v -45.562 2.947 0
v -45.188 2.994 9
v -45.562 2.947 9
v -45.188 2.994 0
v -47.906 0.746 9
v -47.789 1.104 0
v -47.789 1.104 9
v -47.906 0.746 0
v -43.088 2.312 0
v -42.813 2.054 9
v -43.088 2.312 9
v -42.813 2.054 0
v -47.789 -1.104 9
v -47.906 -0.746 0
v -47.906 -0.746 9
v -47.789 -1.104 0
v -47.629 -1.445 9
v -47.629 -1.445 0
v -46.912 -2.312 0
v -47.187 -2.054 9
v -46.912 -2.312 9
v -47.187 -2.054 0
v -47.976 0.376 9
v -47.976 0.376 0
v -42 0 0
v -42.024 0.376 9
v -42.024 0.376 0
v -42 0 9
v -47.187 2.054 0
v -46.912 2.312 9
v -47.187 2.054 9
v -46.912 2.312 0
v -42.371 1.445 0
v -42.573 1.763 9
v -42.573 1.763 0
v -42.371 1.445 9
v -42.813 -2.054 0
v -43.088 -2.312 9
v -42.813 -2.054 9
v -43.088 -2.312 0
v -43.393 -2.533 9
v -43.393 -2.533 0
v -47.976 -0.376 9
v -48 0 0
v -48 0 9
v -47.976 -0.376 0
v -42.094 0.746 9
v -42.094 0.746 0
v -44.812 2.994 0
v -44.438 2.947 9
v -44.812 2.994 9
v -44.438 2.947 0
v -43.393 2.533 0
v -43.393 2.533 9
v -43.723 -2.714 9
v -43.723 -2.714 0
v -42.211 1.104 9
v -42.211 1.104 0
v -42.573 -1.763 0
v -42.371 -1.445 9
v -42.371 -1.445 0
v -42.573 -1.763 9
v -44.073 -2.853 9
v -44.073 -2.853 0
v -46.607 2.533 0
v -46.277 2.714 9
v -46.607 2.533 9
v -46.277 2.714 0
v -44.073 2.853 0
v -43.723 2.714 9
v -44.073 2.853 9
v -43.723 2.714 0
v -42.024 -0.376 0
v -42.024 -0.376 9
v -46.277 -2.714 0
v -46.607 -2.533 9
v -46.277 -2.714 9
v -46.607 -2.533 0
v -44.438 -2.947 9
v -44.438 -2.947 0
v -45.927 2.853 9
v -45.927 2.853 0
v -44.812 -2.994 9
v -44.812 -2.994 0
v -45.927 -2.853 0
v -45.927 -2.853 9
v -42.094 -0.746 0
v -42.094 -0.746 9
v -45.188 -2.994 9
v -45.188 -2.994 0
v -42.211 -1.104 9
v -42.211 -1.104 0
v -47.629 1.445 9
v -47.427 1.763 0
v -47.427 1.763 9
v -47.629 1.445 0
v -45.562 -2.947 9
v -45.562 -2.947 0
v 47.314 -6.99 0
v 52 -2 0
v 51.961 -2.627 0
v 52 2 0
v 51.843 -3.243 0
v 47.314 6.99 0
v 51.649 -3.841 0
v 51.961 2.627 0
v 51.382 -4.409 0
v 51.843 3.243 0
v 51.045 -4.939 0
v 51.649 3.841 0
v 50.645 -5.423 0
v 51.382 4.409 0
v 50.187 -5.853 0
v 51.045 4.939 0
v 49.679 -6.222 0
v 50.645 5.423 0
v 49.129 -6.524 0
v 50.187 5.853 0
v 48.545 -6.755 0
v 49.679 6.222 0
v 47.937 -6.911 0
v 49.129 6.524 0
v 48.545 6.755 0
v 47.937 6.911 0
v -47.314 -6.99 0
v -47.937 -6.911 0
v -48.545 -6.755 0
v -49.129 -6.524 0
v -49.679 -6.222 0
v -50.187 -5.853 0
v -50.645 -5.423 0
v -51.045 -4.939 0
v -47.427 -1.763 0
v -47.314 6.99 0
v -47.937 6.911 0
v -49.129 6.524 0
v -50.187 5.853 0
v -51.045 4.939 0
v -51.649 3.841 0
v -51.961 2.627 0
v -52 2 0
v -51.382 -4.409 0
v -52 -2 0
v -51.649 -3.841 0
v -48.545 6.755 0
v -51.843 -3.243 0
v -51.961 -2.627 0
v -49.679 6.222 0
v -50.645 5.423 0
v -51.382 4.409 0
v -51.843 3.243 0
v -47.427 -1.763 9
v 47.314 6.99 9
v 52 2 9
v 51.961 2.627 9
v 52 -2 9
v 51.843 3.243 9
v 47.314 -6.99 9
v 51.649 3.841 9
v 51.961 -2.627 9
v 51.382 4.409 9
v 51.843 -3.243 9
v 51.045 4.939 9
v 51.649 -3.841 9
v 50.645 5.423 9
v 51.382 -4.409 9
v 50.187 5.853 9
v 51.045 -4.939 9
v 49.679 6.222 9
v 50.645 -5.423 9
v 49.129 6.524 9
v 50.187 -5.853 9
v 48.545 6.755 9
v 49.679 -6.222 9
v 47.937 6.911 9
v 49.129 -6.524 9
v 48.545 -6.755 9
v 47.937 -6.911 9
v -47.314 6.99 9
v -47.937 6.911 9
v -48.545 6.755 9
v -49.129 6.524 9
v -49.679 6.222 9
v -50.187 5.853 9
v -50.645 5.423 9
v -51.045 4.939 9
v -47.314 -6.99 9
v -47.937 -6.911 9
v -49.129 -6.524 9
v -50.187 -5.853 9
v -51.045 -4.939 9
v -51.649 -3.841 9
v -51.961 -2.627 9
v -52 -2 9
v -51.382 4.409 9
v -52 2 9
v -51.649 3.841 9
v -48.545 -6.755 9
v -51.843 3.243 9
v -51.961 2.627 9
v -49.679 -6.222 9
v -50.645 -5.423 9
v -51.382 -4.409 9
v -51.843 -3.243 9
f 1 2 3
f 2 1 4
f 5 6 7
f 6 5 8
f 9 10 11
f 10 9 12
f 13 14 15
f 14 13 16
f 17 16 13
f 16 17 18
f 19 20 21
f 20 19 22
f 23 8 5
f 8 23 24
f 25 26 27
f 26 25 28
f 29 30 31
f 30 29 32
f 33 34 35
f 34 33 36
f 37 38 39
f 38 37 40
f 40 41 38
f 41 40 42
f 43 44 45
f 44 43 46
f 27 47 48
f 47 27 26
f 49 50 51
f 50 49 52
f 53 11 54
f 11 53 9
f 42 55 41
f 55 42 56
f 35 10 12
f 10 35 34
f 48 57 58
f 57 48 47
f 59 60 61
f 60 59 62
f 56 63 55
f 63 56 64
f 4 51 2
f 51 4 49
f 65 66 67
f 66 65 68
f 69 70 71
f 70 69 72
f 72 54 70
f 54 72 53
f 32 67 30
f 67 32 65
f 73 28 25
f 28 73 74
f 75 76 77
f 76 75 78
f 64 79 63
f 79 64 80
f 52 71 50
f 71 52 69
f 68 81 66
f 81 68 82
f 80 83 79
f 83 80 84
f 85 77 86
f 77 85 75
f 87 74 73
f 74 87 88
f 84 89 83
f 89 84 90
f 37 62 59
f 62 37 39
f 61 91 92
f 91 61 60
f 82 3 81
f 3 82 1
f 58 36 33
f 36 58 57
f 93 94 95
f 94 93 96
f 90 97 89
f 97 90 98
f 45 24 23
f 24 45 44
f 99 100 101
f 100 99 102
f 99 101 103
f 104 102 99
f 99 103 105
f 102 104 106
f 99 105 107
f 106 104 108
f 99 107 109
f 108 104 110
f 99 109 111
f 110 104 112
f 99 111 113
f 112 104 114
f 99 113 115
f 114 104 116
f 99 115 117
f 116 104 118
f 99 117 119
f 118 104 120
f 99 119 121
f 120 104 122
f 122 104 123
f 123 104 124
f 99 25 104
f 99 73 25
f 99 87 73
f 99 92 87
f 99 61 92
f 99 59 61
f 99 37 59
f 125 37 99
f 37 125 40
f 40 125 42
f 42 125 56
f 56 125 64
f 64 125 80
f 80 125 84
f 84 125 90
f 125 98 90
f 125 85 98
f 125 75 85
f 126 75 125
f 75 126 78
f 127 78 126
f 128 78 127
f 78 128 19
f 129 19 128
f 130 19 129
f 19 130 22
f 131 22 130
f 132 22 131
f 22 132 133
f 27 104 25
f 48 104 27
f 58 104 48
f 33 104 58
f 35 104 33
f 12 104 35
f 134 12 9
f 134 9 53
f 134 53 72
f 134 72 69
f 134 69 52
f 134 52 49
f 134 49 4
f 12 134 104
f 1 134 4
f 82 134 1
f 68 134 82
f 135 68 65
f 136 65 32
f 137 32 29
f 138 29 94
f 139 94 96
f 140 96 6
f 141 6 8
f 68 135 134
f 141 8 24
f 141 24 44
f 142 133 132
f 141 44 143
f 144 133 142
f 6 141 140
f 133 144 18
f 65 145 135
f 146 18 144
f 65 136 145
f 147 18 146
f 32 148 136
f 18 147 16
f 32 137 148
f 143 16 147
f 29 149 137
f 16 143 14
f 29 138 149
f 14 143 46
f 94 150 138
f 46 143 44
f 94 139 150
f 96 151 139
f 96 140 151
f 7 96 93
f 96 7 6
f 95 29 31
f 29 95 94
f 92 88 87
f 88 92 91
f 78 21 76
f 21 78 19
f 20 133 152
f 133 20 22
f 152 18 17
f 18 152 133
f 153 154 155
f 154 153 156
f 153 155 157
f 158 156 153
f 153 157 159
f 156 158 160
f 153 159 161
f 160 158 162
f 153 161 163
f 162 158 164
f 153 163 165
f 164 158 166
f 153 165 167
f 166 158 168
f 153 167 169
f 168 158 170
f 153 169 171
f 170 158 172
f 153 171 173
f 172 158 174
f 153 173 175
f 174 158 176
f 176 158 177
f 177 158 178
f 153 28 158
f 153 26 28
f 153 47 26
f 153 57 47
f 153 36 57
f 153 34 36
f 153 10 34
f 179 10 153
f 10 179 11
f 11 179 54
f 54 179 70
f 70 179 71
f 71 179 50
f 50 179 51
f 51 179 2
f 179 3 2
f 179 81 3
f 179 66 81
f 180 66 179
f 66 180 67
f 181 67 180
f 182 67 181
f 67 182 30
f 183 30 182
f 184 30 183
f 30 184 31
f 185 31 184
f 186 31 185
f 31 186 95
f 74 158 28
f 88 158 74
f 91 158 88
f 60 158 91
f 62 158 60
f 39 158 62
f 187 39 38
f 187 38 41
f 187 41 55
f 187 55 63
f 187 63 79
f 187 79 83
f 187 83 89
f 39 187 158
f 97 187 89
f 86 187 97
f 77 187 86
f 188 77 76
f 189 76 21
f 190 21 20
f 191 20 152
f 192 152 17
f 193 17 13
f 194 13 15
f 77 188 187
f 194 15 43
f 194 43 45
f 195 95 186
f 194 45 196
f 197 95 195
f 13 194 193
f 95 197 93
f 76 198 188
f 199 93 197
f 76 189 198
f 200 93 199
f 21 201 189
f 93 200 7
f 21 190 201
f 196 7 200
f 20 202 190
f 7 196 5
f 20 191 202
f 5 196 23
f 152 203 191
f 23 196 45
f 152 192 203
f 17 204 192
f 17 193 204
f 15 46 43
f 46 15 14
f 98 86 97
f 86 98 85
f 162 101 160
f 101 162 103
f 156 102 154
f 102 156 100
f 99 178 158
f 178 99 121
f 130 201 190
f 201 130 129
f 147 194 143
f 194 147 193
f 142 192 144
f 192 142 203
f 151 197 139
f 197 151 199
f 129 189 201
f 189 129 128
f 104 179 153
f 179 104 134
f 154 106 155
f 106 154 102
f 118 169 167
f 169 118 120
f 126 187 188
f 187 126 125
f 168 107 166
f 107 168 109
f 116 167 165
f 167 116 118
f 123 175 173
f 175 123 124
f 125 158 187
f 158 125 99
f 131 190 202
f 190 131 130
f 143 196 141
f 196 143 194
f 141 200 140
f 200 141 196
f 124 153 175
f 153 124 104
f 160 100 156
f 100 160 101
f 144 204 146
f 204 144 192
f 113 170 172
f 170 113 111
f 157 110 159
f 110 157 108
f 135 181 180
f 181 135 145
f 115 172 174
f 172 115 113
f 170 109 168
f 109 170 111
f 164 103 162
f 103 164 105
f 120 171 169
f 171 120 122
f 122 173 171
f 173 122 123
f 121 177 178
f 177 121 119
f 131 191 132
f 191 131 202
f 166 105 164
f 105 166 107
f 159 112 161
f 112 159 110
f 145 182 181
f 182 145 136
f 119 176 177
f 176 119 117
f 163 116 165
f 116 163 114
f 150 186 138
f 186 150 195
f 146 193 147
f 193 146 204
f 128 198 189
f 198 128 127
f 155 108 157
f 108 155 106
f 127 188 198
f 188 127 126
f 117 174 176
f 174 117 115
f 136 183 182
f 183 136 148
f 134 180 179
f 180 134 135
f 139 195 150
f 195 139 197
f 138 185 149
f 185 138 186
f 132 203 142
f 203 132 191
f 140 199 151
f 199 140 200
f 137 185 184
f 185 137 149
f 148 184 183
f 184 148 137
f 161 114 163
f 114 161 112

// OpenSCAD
$fn = 50;


difference() {
	union() {
		hull() {
			translate(v = [-47.0000000000, 2.0000000000, 0]) {
				cylinder(h = 9, r = 5);
			}
			translate(v = [47.0000000000, 2.0000000000, 0]) {
				cylinder(h = 9, r = 5);
			}
			translate(v = [-47.0000000000, -2.0000000000, 0]) {
				cylinder(h = 9, r = 5);
			}
			translate(v = [47.0000000000, -2.0000000000, 0]) {
				cylinder(h = 9, r = 5);
			}
		}
	}
	union() {
		translate(v = [-45.0000000000, 0.0000000000, 0]) {
			cylinder(h = 9, r = 3.0000000000);
		}
		translate(v = [-45.0000000000, 0.0000000000, 0]) {
			cylinder(h = 9, r = 1.5000000000);
		}
		translate(v = [-45.0000000000, 0.0000000000, 0]) {
			cylinder(h = 9, r = 1.5000000000);
		}
		translate(v = [-45.0000000000, 0.0000000000, 0]) {
			cylinder(h = 9, r = 1.5000000000);
		}
	}
}
